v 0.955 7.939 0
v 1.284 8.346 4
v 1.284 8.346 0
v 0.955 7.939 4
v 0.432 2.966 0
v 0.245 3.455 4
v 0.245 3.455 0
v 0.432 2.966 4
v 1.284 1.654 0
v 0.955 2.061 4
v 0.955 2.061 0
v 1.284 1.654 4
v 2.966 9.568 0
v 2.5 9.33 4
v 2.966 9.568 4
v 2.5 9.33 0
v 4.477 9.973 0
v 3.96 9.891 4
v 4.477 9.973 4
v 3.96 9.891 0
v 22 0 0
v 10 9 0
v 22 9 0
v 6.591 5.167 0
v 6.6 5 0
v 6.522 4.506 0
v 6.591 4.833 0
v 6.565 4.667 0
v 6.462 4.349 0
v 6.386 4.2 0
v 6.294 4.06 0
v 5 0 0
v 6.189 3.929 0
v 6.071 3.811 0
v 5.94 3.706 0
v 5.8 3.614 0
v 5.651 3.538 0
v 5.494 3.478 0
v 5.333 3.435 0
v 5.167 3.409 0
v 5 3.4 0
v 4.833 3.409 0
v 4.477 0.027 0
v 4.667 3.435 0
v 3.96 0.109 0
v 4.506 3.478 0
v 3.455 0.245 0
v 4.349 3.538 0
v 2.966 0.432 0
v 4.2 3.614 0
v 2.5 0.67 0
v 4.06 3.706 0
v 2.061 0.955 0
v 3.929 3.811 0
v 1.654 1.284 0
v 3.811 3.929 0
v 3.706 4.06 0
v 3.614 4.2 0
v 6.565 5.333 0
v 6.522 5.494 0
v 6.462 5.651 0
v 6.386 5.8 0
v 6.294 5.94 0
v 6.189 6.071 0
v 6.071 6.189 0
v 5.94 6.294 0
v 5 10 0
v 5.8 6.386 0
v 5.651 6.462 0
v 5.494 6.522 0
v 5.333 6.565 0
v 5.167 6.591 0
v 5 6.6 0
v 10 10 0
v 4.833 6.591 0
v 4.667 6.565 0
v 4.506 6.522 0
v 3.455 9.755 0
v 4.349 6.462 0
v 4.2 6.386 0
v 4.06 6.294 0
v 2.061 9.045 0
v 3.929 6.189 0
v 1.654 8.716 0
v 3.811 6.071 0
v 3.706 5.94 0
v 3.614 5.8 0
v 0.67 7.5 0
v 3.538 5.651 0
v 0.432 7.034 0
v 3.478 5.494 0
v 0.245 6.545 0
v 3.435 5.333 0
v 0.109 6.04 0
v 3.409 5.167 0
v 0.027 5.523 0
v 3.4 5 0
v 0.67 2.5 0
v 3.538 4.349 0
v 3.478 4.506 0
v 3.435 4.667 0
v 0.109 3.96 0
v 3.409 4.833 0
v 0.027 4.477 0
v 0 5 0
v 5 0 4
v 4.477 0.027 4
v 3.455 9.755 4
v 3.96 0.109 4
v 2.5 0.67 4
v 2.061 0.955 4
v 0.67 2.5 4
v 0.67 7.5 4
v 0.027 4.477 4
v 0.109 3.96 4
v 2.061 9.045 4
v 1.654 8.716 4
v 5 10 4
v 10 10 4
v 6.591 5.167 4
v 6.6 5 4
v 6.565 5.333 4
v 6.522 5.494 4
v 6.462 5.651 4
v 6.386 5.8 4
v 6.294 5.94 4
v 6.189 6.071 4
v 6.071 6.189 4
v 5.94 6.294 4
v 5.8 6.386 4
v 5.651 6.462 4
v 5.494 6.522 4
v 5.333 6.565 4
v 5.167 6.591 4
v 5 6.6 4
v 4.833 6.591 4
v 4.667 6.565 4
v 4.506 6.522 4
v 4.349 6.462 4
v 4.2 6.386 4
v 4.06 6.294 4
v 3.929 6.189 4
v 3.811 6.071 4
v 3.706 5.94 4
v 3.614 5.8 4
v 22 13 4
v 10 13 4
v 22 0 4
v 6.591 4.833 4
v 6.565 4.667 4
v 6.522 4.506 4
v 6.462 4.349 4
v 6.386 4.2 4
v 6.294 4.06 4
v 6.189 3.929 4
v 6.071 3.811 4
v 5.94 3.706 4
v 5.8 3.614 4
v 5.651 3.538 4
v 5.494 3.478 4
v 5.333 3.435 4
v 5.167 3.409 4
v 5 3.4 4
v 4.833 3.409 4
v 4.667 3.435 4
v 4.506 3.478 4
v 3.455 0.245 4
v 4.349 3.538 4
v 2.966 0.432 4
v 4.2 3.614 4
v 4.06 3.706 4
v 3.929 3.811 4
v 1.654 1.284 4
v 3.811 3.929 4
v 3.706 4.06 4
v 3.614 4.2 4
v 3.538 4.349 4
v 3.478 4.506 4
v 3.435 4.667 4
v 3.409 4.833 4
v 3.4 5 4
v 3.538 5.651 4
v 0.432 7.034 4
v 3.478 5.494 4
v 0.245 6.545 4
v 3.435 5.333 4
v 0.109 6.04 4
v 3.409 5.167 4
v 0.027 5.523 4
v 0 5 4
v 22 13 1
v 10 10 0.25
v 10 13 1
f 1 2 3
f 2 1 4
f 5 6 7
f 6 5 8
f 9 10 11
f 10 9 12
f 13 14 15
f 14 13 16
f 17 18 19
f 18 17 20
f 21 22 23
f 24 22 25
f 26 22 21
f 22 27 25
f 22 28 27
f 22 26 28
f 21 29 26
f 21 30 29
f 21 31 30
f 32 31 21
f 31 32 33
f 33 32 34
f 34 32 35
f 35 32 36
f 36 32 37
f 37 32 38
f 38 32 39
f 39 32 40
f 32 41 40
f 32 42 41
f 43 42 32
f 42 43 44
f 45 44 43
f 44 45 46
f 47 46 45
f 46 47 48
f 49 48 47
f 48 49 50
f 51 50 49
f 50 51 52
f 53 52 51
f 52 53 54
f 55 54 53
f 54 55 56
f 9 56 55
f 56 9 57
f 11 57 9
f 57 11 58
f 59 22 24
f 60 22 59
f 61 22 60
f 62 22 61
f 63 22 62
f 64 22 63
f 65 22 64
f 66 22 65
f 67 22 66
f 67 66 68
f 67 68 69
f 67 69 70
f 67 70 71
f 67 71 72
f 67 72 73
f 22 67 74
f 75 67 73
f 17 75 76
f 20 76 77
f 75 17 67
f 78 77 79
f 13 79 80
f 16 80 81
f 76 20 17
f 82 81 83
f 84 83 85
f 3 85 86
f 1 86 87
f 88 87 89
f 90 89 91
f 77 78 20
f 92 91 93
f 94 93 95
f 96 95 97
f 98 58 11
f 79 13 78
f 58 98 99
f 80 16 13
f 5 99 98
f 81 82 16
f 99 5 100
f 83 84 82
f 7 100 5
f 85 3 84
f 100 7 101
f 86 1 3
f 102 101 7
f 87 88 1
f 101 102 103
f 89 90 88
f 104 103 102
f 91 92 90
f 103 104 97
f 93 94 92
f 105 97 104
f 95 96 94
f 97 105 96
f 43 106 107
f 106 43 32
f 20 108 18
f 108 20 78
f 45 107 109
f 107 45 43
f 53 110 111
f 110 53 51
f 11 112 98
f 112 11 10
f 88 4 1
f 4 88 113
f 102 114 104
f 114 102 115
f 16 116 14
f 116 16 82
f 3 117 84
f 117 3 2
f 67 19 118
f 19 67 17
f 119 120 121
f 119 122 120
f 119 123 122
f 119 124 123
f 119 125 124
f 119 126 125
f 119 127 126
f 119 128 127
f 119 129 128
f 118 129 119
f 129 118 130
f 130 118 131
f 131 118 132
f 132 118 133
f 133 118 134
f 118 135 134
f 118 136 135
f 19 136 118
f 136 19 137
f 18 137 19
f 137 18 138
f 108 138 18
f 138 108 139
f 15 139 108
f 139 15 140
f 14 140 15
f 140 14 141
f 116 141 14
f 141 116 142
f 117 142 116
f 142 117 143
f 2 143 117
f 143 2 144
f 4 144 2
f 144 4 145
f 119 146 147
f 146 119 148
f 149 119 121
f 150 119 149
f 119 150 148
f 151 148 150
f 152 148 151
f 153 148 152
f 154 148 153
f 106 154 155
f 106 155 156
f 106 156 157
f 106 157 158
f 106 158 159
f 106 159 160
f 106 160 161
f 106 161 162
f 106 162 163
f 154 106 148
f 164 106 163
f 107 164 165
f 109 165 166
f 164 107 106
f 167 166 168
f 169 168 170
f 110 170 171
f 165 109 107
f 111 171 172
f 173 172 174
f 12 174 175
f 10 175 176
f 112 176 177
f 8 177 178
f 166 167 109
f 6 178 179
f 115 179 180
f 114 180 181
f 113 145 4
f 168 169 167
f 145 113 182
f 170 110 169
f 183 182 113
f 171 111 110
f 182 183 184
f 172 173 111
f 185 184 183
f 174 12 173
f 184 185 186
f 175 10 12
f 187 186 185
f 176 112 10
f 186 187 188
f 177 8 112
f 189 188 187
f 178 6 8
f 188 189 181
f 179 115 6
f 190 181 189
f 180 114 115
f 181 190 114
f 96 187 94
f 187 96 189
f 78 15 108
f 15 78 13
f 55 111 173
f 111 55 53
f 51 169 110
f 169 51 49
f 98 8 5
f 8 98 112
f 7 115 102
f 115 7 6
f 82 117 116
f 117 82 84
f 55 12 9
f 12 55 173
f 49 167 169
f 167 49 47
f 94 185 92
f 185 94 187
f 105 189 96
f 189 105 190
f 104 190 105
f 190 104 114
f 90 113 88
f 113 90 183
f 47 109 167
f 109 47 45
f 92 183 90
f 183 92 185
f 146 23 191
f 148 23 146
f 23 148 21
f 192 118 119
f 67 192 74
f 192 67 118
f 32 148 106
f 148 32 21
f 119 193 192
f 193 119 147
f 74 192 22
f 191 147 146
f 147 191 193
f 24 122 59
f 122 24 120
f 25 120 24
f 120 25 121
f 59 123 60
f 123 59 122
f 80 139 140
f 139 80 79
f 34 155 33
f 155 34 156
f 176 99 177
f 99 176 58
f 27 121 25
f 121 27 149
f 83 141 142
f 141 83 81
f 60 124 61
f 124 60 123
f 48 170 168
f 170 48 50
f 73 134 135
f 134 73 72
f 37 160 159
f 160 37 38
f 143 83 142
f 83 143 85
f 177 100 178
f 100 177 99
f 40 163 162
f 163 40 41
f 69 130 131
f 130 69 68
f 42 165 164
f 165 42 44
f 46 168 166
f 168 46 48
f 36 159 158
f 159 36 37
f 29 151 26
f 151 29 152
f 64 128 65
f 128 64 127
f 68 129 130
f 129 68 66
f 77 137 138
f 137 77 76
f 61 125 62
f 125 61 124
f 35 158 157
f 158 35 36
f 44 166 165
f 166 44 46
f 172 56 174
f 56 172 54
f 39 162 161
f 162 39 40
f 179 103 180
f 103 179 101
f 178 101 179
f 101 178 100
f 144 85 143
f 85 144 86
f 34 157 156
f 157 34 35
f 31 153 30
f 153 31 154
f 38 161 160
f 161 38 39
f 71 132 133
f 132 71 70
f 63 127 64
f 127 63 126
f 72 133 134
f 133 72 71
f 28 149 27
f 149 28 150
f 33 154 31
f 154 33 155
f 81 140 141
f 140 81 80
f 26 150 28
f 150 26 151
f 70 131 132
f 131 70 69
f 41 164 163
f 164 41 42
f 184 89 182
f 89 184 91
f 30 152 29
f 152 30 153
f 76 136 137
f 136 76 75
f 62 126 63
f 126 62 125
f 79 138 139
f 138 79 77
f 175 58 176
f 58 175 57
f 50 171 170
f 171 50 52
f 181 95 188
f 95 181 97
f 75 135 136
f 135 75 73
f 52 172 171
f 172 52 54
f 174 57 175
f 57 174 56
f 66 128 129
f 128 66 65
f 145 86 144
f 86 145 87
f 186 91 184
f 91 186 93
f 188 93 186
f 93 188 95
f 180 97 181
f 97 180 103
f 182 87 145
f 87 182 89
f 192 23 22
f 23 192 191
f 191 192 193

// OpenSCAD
// file: config_4x5.scad
/*
This is the base configuration file for the 4x5" format
# we are not using the exact ANSI measures, but slightly rounded measures for slight simplification
*/
vStabilizerTotal_h = 7;

// general tolerance
vTolerance = 0.2;

// sheet film and cassette measurements (roughly based on the ANSI measurements)
vFilmSheet_l = 127;
vFilmSheet_w = 102;
vCassette_l = 160; // A min
vCassette_w = 121; // B max
vCassette_h = 13.2; // C max
vLightTrap_l = 2; // M2
vLightTrap_w = vCassette_w;
vLightTrap_h = 1.5; // M1
vLightTrap_offsetX = 141; // G max
vFilmWindow_l = 121;
vFilmWindow_w = 101;
vFilmWindow_offsetX = 16;
vGroundGlass_offsetZ = 5;

// Graflok
vGraflok_h = 6; // this is not the official measurement, just measured from a camera 

// lens board measures (we are using Wista/Technika-style lensboards)
vLensboard_l = 100;
vLensboard_w = 97;
vLensboard_h = 2;
vLensboard_offsetX = -(vLensboard_l+3)/2; // caution: we have an asymetric offset!
vLensboard_offsetY = -vLensboard_w/2;
vLensboardHole_d = 85;
vLensboardLighttrap_d = 89;
vLensboardLighttrap_h = 1+vTolerance;

// bellows frame measures - the bellows frame design is derived from standardcameras.com
// back frame
vBellowsBackInner_l = 144; //???? check and replace with the measurement from your bellows!
vBellowsBackInner_w = vBellowsBackInner_l;
vBellowsBackOuter_l = vBellowsBackInner_l+1;
vBellowsBackOuter_w = vBellowsBackOuter_l;

vBellowsBackFrameOuter_l = 159;
vBellowsBackFrameOuter_w = vBellowsBackFrameOuter_l;
vBellowsBackFrameOuter_h = 7;
vBellowsBackFrameInner_l = 135;
vBellowsBackFrameInner_w = vBellowsBackFrameInner_l;
vBellowsBackFrameInner_h = 5;

vBellowsBackLightTrapOuter_l = vBellowsBackFrameInner_l+2*2;
vBellowsBackLightTrapOuter_w = vBellowsBackLightTrapOuter_l;
vBellowsBackLightTrap_h = 3;

vBellowsBackFrameScrewHole_d = 2;
vBellowsBackFrameScrewHole_h = 10;
vBellowsBackFrameScrewHole_offsetXY = 70;
vBellowsBackFrameScrewHole_offsetZ = vBellowsBackFrameOuter_h/2;

// front frame
vBellowsFrontInner_l = 94; //???? check and replace with the measurement from your bellows!
vBellowsFrontInner_w = vBellowsFrontInner_l;
vBellowsFrontOuter_l = vBellowsFrontInner_l+1;
vBellowsFrontOuter_w = vBellowsFrontOuter_l;

vBellowsFrontFrameOuter_l = 104;
vBellowsFrontFrameOuter_w = vBellowsFrontFrameOuter_l;
vBellowsFrontFrameOuter_h = 7;
vBellowsFrontFrameInner_l = 82;
vBellowsFrontFrameInner_w = vBellowsFrontFrameInner_l;
vBellowsFrontFrameInner_h = 5;

vBellowsFrontLightTrapOuter_l = vBellowsFrontFrameInner_l+2*2;
vBellowsFrontLightTrapOuter_w = vBellowsFrontLightTrapOuter_l;
vBellowsFrontLightTrap_h = 0;

vBellowsFrontFrameScrewHole_d = 2;
vBellowsFrontFrameScrewHole_h = 10;
vBellowsFrontFrameScrewHole_offsetXY = 40;
vBellowsFrontFrameScrewHole_offsetZ = vBellowsFrontFrameOuter_h/2;

// body dimensions
vWall_strength = 5;
vBodyOuter_l = 185; // make sure this is at least 4*vWall_strength larger than vBellowsBackFrameOuter_l!
vBodyOuter_w = 170; // make sure this is at least 2*vWall_strength larger than vBellowsBackFrameOuter_l!
vBodyOuter_h = 65;
vBodyEdge_r = vWall_strength;

// we will center our model on the Y axis and on the center of the bellows frame
// at least for the 4x5 version, we have to do an asymetric offset of 2.5mm on the X-axis 
vAsymOffsetX = -2.5;  

// back plate
vBackPlateLength = 160; // we will probably use about the same size as the bellows back frame
vBackPlateStrength = vWall_strength;

// hinges for front lid
vHingeInnerDistance = 100;
vHingeBaseWidth = 20;
vHingeHole = 5;

// lid lock measures
vLidLockBase_d = 8;
vLidLockHole_distance = 70;

// rail dimensions
vLowerRail_w = 90;
vUpperRail_w = vLowerRail_w;

// cutout for stop indents
vStopIndent_l = 4;
vStopIndent_h = 5;
vStopIndentDistance = 25; // shorter than 25 is not necessary
vStopIndent_offsetX = 20; // don't go shorter than 20 if you intend to use a 90mm lens!

// for all dovetails we use a base width of 5mm and a base height of 5mm
// we are applying tolerances to the inner AND outer part of a dovetail, in width and height
vDoveTail_w = 5;
vDoveTail_h = 5;
vDoveTail_tolerance = 0.2;

// front standard carrier / slider
// width is depending on vUpperRail_w
vSliderBase_w = vUpperRail_w + (4*vDoveTail_w);
vSliderBase_l = 40; // make sure to have enough space in the body.


// lever plate 
vLeverPlateBase_w = vUpperRail_w - (8*vDoveTail_w);
vLeverPlateBlock_w = 25;
vLeverPlateBlock_l = vSliderBase_l-(2*vDoveTail_w);

vFrontStandard_h = 130;
vFrontStandardSlot_h = vFrontStandard_h - 30;

// lensboard carrier
vFrontPlate_length = vSliderBase_w+6; // vSliderBase_w is a bit too tight for 4x5", so there we will add 5mm, for 5x7 vSliderBase_w is OK to get a squared lensboard carrier
vFrontPlate_width = vSliderBase_w; //vFrontPlate_length;
vFrontPlate_height = 16;
vEdgeCutCylinder = floor(sqrt(2*pow(vFrontPlate_width,2)))-5;

vTiltDovetailBase_d1 = 30;
vTiltDovetailBase_d2 = vTiltDovetailBase_d1+(2*vDoveTail_w);
vTiltDovetailBaseBlock_d = vTiltDovetailBase_d1+(4*vDoveTail_w);

vTiltDovetail_d1 = vTiltDovetailBase_d1-vTolerance;
vTiltDovetail_d2 = vTiltDovetailBase_d2-vTolerance;
vTiltDovetail_h = vDoveTail_w-vTolerance;

vTiltDovetailCutout_d1 = vTiltDovetailBase_d2+vTolerance;
vTiltDovetailCutout_d2 = vTiltDovetailBase_d1+vTolerance;

vAxisHole_d = 10+vTolerance;
vAxisHole_h = vDoveTail_w+vTolerance;

vTiltLockBolt_d = 12;
vTiltLockBolt_h = 14;
vTiltLockBoltHole_d = 8;
vTiltLockBoltHole_h = vTiltLockBolt_h;

vTiltHeight = 50;
vTiltRadius = vFrontPlate_length/2;
vTiltAngleMinus = -7;
vTiltAnglePlus = 7;
vTiltAxis_d = 10-vTolerance;

// focusing rod
vFocusingRod_d = 6;
vFocusingKnob_d = 25;
vFocusingKnob_h = 20;

// stabilizer measures (just the outer measures of our stabilizer block, not the tripod slider)
vStabilizerBase_l = 135;
vStabilizerBase_w = 90;  
vStabilizerBase_h = 7;
vStabilizerDovetailBase_w = 50;
// screw holes for the stabilizer
vLidHoleCount_x = 4;
vLidHoleDist_x = 35;
vLidHoleCount_y = 2;
vLidHoleDist_y = 60;


// screw diameters, length is individually set
vScrew1Hole_d = 3;
vScrew1ThreadHole_d = 2.2;
vScrew2Hole_d = 2;
vScrew2ThreadHole_d = 1.4;


 
// file: baseconfig.scad
/*
Here we define some variables which are independent from the camera format
*/


// some generic variables

// we are including a format specific configuration sheet - but make sure to include only one!

include <config_4x5.scad>;
// include <config_5x7.scad>;
// include <config_8x10.scad>;

// Arca Swiss tripod plate
// caution: some Arca Swiss compatible tripod heads may have slight variations
// vArca_length = xx; // the length is irrelevant here
vArca_width = 38;
vArca_height = 7;
vArcaBase_cutout = 4;
vArcaBase_height = 1.5;
// file: modules.scad
/*
This is a collection of the modules which are used heavily within the whole project.
Almost all parts rely on the modules to remain "as is", especially regarding their current orientation.
So please act very carefully here, otherwise you may screw up the complete design!

*/
include <baseconfig.scad>;


// roof module - this is heavily used for dovetail cutouts
// please keep as is
module roof(l, w, h){
    polyhedron(
        points=[
            [0,0,0],
            [l,0,0],
            [l,w,0],
            [0,w,0],
            [0,w/2,h],
            [l,w/2,h]
            ],
        faces=[
            [0,1,2,3],
            [0,4,1],
            [1,4,5,2],
            [2,5,3],
            [3,5,4,0]
            ]
            );
    };

// a wedge module - this is heavily used for cutting edges
// please keep as is    
module wedge(l, w, h) {
    polyhedron(
            points=[
                [0,0,0],
                [l,0,0],
                [l,w,0],
                [0,w,0],
                [0,0,h],
                [l,0,h]
            ],
            faces=[
                [0,3,2,1],
                [0,1,5,4],
                [1,2,5],
                [2,3,4,5],
                [3,0,4]
            ]
    );
   };

// simple tube module.   
module tube(d1, d2, h) {
    difference() {
        cylinder(d=d1, h=h);
        cylinder(d=d2, h=h);
        };
    };

// mainly used for making holes for countersunk screws
// please keep as is    
module countersunk_screw(vScrew_d, vScrew_l){
    union(){
    cylinder(d=vScrew_d, h=vScrew_l);
    cylinder(d1=vScrew_d*2, d2=0, h=vScrew_d);
    };
};

// module for making hexagons, e.g. hex nuts. kw is the key width
// please keep as is
module hex(kw, h) {
	render()
        translate([0, 0, h/2])
            intersection_for(a = [0, 120, 240]) {
                rotate([0, 0, a])
                    cube([kw, 3 * kw, h], true);
                }
}


// Heatset insert
// d: Thread diameter
// od: Outer diameter
// l: Total length
module insert(d, od, l)
{
    echo(Insert = d, od, l);
    difference() {
        cylinder(l, d=od, $fn=15);
        translate([0, 0, -0.5]) cylinder(l+1, d=d, $fn=15);
        };
}

module insert_m2()
{
    color("gold") insert(2, vInsertM2Size_d, vInsertM2Depth_h);
}

module insert_m3()
{
    color("gold") insert(3, vInsertM3Size_d, vInsertM3Depth_h);
}

module insert_m5()
{
    color("gold") insert(5, vInsertM5Size_d, vInsertM5Depth_h);
}

// Countersunk screw, metric, for display
// Example: https://www.aliexpress.com/item/1005007838338973.html
module screw_cs(l, d=3, dk=6, s=2, t=1) {
    // l: total length (including head) in mm
    // d: thread diameter (eg 3 for M3)
    // dk: max head diameter
    // s: hex socket flat-to-flat size
    // t: hex socket depth
    echo(CountersunkScrew = d, l);
    difference() {
        union() {
            cylinder(h=l, r=d/2, $fn=15);
            cylinder(h=(dk-d)/2, r1=dk/2, r2=d/2, $fn=15);
            }
        cylinder(h=t, r=s/2*2/sqrt(3), $fn=6);
    }
}

module screw_m3_cs(l) {
    color("silver") screw_cs(l, d=3, dk=6, s=2, t=1);
}

module screw_m2_cs(l) {
    color("silver") screw_cs(l, d=2, dk=3.8, s=1.5, t=0.75);
}
module screw_m5_cs(l) {
    color("silver") screw_cs(l, d=5, dk=9.5, s=3, t=1.6);
}

// Button head screw, metric, for display
// Example: https://www.aliexpress.com/item/32967225441.html
module screw_bh(l, d=3, k=1.5, dk=5.5, s=2, t=1) {
    // l: shaft length (NOT including head) in mm
    // d: thread diameter (eg 3 for M3)
    // k: head depth
    // dk: head max diameter
    // s: hex socket flat-to-flat size
    // t: hex socket depth
    echo(BallheadScrew = d, l);
    difference() {
        union() {
            translate([0, 0, k]) cylinder(h=l, r=d/2, $fn=15);
            difference() {
                translate([0, 0, k]) intersection() {
                    sphere(d=dk, $fn=15);
                    translate([-dk/2, -dk/2, -dk]) cube(dk);
                }
                translate([-dk/2, -dk/2, -dk]) cube(dk);
            }
        }
        cylinder(h=t, r=s/2*2/sqrt(3), $fn=6);
    }
}

module screw_m2_bh(l) {
    color("silver") screw_bh(l, d=2, dk=3.4, s=1.175, t=0.6);
}

module screw_m3_bh(l) {
    color("silver") screw_bh(l, d=3, dk=5.7, s=2, t=1);
}


module nut_m5() {
    echo(Nut = 5);
    difference() {
        rotate([0, 0, 30]) cylinder(h=3.9, d=8*2/sqrt(3), $fn=6);
        cylinder(h=5, d=5, $fn=15);
        }
    }
    
    
module thumbscrew(bolt_d, bolt_dk, screw_d, screw_h, n_knurls, knurl_d, knurl_f) {
    // bolt_d:  central bolt diameter
    // bolt_dk: bolt head max diameter
    // screw_d: thumbscrew outer diameter
    // screw_h: thumbscrew height
    // n_knurls: number of knurls
    
    min_knurl_offset = screw_d/2 - knurl_d;
    max_knurl_offset = screw_d/2 + knurl_d;
    knurl_offset = min_knurl_offset + knurl_f*(max_knurl_offset - min_knurl_offset);
    
    difference()
    {
        union()
        {
            translate([0, 0, 1]) cylinder(screw_h-2, d=screw_d);
            cylinder(1, d1=screw_d-1, d2=screw_d);
            translate([0, 0, screw_h-1]) cylinder(1, d1=screw_d, d2=screw_d-1);
        }
        cylinder(screw_h, d=bolt_d);
        cylinder(bolt_dk/2, d1=bolt_dk, d2=0);
        for (i = [1:n_knurls])
        {
            rotate([0, 0, i*360/(n_knurls)]) translate([knurl_offset, 0, 0]) cylinder(screw_h, d=knurl_d);
        }
    }
}

module thumbscrew_m5(screw_d, screw_h, n_knurls, knurl_d, knurl_f) {
    thumbscrew(5, 9.5, screw_d, screw_h, n_knurls, knurl_d, knurl_f);
}


module t6_flange_coupler() {
    // T6 flange coupler
    // Example: https://www.aliexpress.com/item/1005008049363389.html
    echo(FlangeCoupler = 6);
    difference() {
        union() {
            translate([0, 0, 2]) cylinder(h=10, d=10);
            cylinder(h=2, d=22);
        }
        cylinder(h=12, d=6);
        translate([0, 15, 7]) rotate([90, 0, 0]) cylinder(h=30, d=3);
        for (i = [0:3]) {
            rotate([0, 0, 45+90*i]) translate([-8, 0, 0]) cylinder(h=2, d=3);
        }
    }
}


module AXK0619_thrust_bearing() {
    echo(ThrustBearing = "AXK0619");
    difference() {
        cylinder(h=4, d=19);
        cylinder(h=4, d=6);
    }
}


module t6_lead_screw(l) {
    echo(LeadScrewT6 = l);
    color("silver") cylinder(h=l, d=6);
}

module t6_lead_screw_nut() {
    echo("LeadScrewT6Nut");
    intersection()
    {
        difference() {
            union() {
                cylinder(h=15, d=12);
                translate([0, 0, 1.5]) cylinder(h=3.5, d=24);
            }
            cylinder(h=15, d=6);
        }  
        translate([-50, -12.5/2, -50]) cube([100, 12.5, 100]);
    }
}

module m5_rod(l) {
    echo(ThreadedRodM5 = l);
    color("silver") cylinder(h=l, d=5);
}


module screw_m3_grub(l) {
    echo(GrubScrew = 3, l);
    cylinder(h=l, d=3, $fn=15);
}
// main file
// some variables
$fn = 60; // we are using 60 fragments for cylinders and similar objects

// some modules such as hex, countersunk screws, roof, wedge are available in a module file
use <modules.scad>;

module locking_lever() {

// variables

vTolerance = 0.2;


vLockingLeverRadius_r = 5;


vLockingLeverRadius_offsetX = vLockingLeverRadius_r;
vLockingLeverRadius_offsetY = vLockingLeverRadius_r;
vLockingLeverRadius_offsetZ = 0;

vLockingLever_l = vLockingLeverRadius_r+12;
vLockingLever_w = 2*vLockingLeverRadius_r;
vLockingLever_h = 4;
vLockingLever_offsetX = vLockingLeverRadius_r;
vLockingLever_offsetY = 0;
vLockingLever_offsetZ = 0;

vLockingLeverExtension_l = 12;
vLockingLeverExtension_w = 8;
vLockingLeverExtension_h = vLockingLever_h;
vLockingLeverExtension_offsetX = 2*vLockingLeverRadius_r;
vLockingLeverExtension_offsetY = vLockingLeverRadius_r;
vLockingLeverExtension_offsetZ = 0;


vLockingLeverRampCutoff_l = -vLockingLeverExtension_w/2;
vLockingLeverRampCutoff_w = vLockingLeverExtension_l;
vLockingLeverRampCutoff_h = 1;
vLockingLeverRampCutoff_offsetX = vLockingLeverExtension_offsetX;
vLockingLeverRampCutoff_offsetY = vLockingLeverRadius_r+vLockingLeverExtension_w;
vLockingLeverRampCutoff_offsetZ = 0;

vScrewHole_d = 3+vTolerance;
vScrewHole_h = vLockingLever_h;

difference(){
union(){
    translate([vLockingLeverRadius_offsetX, vLockingLeverRadius_offsetY, vLockingLeverRadius_offsetZ])
        cylinder(r=vLockingLeverRadius_r, h=vLockingLever_h);
    translate([vLockingLever_offsetX, vLockingLever_offsetY, vLockingLever_offsetZ])
        cube([vLockingLever_l, vLockingLever_w, vLockingLever_h]);
    translate([vLockingLeverExtension_offsetX, vLockingLeverExtension_offsetY, vLockingLeverExtension_offsetZ])
        cube([vLockingLeverExtension_l, vLockingLeverExtension_w, vLockingLeverExtension_h]);
    };    
translate([vLockingLeverRadius_offsetX, vLockingLeverRadius_offsetY, vLockingLeverRadius_offsetZ])
        cylinder(d=vScrewHole_d, h=vScrewHole_h);
    translate([vLockingLeverRampCutoff_offsetX, vLockingLeverRampCutoff_offsetY, vLockingLeverRampCutoff_offsetZ])
        wedge(vLockingLeverRampCutoff_w, vLockingLeverRampCutoff_l, vLockingLeverRampCutoff_h);
};

};

locking_lever();
